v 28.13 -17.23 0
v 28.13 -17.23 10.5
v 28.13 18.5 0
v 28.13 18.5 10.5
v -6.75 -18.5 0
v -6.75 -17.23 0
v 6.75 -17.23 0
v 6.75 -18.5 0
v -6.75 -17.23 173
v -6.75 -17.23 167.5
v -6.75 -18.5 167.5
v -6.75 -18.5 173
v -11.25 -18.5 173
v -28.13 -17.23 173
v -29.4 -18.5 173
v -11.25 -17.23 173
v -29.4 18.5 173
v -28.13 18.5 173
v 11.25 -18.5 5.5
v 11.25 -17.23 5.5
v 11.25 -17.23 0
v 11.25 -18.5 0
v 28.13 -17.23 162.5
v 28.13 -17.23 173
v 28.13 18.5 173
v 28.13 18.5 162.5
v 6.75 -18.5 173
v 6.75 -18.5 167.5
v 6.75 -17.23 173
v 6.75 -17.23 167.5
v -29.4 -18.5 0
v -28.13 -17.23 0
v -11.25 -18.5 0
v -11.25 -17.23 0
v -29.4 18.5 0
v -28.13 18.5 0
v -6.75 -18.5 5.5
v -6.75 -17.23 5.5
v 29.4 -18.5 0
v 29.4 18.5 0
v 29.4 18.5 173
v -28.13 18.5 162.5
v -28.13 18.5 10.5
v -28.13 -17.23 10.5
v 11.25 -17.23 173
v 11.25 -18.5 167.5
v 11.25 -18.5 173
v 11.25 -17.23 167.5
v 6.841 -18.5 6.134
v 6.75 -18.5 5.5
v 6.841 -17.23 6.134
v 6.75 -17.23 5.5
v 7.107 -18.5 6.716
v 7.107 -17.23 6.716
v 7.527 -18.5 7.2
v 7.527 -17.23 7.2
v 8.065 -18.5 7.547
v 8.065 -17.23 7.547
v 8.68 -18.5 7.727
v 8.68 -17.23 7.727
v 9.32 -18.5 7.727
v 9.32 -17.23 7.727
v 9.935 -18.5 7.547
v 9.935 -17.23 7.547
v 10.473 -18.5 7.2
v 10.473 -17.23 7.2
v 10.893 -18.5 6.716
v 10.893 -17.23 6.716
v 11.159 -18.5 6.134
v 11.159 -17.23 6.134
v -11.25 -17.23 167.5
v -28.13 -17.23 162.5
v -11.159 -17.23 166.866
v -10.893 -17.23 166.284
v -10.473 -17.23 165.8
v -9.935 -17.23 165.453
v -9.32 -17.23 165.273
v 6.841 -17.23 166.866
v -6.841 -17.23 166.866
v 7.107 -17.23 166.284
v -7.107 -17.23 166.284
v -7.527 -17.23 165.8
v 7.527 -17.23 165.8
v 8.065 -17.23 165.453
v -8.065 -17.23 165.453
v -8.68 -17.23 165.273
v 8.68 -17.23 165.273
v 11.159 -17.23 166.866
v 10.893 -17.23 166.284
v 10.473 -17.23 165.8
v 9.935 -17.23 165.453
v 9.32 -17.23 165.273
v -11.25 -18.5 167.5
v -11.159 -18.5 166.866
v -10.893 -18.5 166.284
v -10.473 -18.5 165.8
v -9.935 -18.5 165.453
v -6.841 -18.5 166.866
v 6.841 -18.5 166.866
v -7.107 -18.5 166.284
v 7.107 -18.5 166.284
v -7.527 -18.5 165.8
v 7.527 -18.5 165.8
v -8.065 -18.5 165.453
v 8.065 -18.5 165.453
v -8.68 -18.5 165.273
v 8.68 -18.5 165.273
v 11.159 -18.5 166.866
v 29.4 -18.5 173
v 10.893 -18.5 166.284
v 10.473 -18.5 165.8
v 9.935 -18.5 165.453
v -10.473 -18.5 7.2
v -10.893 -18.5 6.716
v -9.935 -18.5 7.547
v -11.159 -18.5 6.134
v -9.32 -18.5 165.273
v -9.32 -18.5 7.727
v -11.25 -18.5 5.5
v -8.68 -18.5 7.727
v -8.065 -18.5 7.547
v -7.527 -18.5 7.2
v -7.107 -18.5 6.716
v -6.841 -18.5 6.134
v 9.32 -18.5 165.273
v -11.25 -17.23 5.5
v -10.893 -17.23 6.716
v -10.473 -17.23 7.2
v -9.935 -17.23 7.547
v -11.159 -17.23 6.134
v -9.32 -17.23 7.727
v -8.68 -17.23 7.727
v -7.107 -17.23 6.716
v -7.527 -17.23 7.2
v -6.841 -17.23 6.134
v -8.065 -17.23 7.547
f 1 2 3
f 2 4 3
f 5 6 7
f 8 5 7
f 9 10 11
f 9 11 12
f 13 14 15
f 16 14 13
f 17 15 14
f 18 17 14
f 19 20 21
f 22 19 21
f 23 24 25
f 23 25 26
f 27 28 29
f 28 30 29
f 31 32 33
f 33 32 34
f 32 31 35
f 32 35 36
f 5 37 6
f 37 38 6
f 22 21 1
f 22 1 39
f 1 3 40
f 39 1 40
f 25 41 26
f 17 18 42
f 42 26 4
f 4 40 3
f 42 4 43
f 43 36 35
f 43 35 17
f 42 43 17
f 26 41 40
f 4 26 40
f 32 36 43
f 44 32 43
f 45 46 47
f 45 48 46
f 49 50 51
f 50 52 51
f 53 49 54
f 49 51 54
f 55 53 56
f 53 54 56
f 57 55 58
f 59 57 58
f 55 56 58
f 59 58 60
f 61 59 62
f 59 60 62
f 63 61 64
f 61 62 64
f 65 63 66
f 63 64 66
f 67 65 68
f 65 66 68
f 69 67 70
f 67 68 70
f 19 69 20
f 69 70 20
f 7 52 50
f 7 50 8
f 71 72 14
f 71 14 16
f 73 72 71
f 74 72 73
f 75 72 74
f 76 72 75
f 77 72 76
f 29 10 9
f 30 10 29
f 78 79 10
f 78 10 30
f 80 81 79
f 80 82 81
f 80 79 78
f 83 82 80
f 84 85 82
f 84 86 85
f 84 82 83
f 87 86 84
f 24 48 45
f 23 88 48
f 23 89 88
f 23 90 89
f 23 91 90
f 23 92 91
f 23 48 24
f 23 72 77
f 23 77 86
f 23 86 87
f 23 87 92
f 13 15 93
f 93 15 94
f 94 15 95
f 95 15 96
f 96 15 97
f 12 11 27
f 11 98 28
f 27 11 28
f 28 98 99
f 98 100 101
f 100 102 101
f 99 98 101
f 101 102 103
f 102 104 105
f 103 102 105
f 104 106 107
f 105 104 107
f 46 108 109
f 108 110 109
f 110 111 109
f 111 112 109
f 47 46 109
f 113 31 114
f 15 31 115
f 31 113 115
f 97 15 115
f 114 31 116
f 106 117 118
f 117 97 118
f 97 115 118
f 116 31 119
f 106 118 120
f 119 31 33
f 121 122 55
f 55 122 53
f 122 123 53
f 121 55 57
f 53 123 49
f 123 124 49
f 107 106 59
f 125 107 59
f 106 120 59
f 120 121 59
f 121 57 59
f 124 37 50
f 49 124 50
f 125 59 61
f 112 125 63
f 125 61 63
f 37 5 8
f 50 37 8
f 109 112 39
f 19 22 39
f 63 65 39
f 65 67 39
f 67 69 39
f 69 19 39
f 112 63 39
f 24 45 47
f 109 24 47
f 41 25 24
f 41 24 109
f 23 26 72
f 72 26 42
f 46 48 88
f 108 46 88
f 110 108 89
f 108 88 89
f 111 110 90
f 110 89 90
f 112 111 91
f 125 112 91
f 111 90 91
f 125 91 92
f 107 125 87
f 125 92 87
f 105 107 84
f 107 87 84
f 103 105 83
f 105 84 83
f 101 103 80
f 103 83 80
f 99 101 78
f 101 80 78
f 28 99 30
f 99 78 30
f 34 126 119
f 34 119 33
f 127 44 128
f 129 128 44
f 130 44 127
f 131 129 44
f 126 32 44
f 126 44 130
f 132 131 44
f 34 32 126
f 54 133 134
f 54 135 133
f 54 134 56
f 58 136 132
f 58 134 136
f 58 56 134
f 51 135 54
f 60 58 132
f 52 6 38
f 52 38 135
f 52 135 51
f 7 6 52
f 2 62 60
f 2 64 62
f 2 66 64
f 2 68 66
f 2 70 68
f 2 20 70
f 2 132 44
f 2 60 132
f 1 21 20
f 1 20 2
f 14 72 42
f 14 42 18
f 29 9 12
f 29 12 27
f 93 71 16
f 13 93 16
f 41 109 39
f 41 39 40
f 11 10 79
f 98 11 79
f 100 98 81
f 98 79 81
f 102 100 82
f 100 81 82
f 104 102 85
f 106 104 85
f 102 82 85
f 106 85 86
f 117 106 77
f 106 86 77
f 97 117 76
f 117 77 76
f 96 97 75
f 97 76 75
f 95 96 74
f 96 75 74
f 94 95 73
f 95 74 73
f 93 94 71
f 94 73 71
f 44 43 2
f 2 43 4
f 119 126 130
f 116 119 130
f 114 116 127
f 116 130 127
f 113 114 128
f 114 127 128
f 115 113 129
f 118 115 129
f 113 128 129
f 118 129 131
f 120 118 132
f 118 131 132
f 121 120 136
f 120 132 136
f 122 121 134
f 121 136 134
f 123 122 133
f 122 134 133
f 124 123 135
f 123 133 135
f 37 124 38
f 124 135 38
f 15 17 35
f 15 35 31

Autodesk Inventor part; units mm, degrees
ref_plane "YZ Plane" through (0, 0, 0) normal (1, 0, 0) x (0, 1, 0)
ref_plane "XZ Plane" through (0, 0, 0) normal (0, 1, 0) x (-1, 0, 0)
sketch "Sketch1" plane through (0, 0, 0) normal (0, 0, 1) x (1, 0, 0)
  line L0 (-29.4, -18.5) -> (29.4, -18.5)
  line L1 (29.4, -18.5) -> (29.4, 18.5)
  line L2 (29.4, 18.5) -> (-29.4, 18.5)
  line L3 (-29.4, 18.5) -> (-29.4, -18.5)
  line L4 (-29.4, -18.5) -> (29.4, 18.5) construction
  line L5 (29.4, -18.5) -> (-29.4, 18.5) construction
  point P0 (0, 0)
  dimension "d0" = 58.8
  dimension "d1" = 37
extrude "Extrusion1" add sketch "Sketch1" along normal blind 173
sketch "Sketch2" plane through (-29.4, 18.5, 0) normal (0, 1, 0) x (1, 0, 0)
  line L0 (58.8, -173) -> (0, -173) projected
  line L1 (58.8, 0) -> (0, 0) projected
  arc A0 (22.65, -167.5) -> (18.15, -167.5) centre (20.4, -167.5) ccw
  arc A1 (40.65, -167.5) -> (36.15, -167.5) centre (38.4, -167.5) ccw
  arc A2 (36.15, -5.5) -> (40.65, -5.5) centre (38.4, -5.5) ccw
  arc A3 (18.15, -5.5) -> (22.65, -5.5) centre (20.4, -5.5) ccw
  line L2 (20.4, -167.5) -> (20.4, -5.5) construction
  line L3 (20.4, -5.5) -> (38.4, -5.5) construction
  line L4 (38.4, -5.5) -> (38.4, -167.5) construction
  line L5 (20.4, -167.5) -> (20.4, -173) construction
  line L6 (20.4, -5.5) -> (20.4, 0) construction
  line L7 (20.4, -5.5) -> (0, 0) construction
  line L8 (38.4, -5.5) -> (58.8, 0) construction
  line L9 (36.15, -167.5) -> (36.15, -173)
  line L10 (40.65, -167.5) -> (40.65, -173)
  line L11 (18.15, -167.5) -> (18.15, -173)
  line L12 (22.65, -167.5) -> (22.65, -173)
  line L13 (22.65, -5.5) -> (22.65, 0)
  line L14 (18.15, -5.5) -> (18.15, 0)
  line L15 (40.65, -5.5) -> (40.65, 0)
  line L16 (36.15, -5.5) -> (36.15, 0)
  point P0 (29.4, 0)
  dimension "d4" = 2.25
  dimension "d5" = 162
  dimension "d6" = 18
extrude "Extrusion2" cut sketch "Sketch2" against normal up to surface (37 mm away)
ref_plane "Work Plane1" through (29.4, -17.23, 0) normal (0, -1, 0) x (1, 0, 0)
sketch "Sketch3" plane through (-29.4, 18.5, 173) normal (0, 1, 0) x (1, 0, 0)
  line L0 (0, 173) -> (0, 0) projected
  line L1 (58.8, 173) -> (58.8, 0) projected
  line L2 (57.53, 0) -> (57.53, 10.5)
  line L3 (57.53, 10.5) -> (1.27, 10.5)
  line L4 (1.27, 10.5) -> (1.27, 0)
  line L5 (1.27, 0) -> (57.53, 0)
  line L6 (1.27, 0) -> (0, 0) construction
  line L7 (58.8, 0) -> (57.53, 0) construction
  line L8 (1.27, 162.5) -> (57.53, 162.5)
  line L9 (57.53, 162.5) -> (57.53, 173)
  line L10 (57.53, 173) -> (1.27, 173)
  line L11 (1.27, 173) -> (1.27, 162.5)
  line L12 (1.27, 173) -> (0, 173) construction
  point P0 (29.4, 173)
  dimension "d9" = 1.27
  dimension "d14" = 152
extrude "Extrusion3" cut sketch "Sketch3" against normal up to surface (35.73 mm away)
properties part number "UHP-1500-230"
